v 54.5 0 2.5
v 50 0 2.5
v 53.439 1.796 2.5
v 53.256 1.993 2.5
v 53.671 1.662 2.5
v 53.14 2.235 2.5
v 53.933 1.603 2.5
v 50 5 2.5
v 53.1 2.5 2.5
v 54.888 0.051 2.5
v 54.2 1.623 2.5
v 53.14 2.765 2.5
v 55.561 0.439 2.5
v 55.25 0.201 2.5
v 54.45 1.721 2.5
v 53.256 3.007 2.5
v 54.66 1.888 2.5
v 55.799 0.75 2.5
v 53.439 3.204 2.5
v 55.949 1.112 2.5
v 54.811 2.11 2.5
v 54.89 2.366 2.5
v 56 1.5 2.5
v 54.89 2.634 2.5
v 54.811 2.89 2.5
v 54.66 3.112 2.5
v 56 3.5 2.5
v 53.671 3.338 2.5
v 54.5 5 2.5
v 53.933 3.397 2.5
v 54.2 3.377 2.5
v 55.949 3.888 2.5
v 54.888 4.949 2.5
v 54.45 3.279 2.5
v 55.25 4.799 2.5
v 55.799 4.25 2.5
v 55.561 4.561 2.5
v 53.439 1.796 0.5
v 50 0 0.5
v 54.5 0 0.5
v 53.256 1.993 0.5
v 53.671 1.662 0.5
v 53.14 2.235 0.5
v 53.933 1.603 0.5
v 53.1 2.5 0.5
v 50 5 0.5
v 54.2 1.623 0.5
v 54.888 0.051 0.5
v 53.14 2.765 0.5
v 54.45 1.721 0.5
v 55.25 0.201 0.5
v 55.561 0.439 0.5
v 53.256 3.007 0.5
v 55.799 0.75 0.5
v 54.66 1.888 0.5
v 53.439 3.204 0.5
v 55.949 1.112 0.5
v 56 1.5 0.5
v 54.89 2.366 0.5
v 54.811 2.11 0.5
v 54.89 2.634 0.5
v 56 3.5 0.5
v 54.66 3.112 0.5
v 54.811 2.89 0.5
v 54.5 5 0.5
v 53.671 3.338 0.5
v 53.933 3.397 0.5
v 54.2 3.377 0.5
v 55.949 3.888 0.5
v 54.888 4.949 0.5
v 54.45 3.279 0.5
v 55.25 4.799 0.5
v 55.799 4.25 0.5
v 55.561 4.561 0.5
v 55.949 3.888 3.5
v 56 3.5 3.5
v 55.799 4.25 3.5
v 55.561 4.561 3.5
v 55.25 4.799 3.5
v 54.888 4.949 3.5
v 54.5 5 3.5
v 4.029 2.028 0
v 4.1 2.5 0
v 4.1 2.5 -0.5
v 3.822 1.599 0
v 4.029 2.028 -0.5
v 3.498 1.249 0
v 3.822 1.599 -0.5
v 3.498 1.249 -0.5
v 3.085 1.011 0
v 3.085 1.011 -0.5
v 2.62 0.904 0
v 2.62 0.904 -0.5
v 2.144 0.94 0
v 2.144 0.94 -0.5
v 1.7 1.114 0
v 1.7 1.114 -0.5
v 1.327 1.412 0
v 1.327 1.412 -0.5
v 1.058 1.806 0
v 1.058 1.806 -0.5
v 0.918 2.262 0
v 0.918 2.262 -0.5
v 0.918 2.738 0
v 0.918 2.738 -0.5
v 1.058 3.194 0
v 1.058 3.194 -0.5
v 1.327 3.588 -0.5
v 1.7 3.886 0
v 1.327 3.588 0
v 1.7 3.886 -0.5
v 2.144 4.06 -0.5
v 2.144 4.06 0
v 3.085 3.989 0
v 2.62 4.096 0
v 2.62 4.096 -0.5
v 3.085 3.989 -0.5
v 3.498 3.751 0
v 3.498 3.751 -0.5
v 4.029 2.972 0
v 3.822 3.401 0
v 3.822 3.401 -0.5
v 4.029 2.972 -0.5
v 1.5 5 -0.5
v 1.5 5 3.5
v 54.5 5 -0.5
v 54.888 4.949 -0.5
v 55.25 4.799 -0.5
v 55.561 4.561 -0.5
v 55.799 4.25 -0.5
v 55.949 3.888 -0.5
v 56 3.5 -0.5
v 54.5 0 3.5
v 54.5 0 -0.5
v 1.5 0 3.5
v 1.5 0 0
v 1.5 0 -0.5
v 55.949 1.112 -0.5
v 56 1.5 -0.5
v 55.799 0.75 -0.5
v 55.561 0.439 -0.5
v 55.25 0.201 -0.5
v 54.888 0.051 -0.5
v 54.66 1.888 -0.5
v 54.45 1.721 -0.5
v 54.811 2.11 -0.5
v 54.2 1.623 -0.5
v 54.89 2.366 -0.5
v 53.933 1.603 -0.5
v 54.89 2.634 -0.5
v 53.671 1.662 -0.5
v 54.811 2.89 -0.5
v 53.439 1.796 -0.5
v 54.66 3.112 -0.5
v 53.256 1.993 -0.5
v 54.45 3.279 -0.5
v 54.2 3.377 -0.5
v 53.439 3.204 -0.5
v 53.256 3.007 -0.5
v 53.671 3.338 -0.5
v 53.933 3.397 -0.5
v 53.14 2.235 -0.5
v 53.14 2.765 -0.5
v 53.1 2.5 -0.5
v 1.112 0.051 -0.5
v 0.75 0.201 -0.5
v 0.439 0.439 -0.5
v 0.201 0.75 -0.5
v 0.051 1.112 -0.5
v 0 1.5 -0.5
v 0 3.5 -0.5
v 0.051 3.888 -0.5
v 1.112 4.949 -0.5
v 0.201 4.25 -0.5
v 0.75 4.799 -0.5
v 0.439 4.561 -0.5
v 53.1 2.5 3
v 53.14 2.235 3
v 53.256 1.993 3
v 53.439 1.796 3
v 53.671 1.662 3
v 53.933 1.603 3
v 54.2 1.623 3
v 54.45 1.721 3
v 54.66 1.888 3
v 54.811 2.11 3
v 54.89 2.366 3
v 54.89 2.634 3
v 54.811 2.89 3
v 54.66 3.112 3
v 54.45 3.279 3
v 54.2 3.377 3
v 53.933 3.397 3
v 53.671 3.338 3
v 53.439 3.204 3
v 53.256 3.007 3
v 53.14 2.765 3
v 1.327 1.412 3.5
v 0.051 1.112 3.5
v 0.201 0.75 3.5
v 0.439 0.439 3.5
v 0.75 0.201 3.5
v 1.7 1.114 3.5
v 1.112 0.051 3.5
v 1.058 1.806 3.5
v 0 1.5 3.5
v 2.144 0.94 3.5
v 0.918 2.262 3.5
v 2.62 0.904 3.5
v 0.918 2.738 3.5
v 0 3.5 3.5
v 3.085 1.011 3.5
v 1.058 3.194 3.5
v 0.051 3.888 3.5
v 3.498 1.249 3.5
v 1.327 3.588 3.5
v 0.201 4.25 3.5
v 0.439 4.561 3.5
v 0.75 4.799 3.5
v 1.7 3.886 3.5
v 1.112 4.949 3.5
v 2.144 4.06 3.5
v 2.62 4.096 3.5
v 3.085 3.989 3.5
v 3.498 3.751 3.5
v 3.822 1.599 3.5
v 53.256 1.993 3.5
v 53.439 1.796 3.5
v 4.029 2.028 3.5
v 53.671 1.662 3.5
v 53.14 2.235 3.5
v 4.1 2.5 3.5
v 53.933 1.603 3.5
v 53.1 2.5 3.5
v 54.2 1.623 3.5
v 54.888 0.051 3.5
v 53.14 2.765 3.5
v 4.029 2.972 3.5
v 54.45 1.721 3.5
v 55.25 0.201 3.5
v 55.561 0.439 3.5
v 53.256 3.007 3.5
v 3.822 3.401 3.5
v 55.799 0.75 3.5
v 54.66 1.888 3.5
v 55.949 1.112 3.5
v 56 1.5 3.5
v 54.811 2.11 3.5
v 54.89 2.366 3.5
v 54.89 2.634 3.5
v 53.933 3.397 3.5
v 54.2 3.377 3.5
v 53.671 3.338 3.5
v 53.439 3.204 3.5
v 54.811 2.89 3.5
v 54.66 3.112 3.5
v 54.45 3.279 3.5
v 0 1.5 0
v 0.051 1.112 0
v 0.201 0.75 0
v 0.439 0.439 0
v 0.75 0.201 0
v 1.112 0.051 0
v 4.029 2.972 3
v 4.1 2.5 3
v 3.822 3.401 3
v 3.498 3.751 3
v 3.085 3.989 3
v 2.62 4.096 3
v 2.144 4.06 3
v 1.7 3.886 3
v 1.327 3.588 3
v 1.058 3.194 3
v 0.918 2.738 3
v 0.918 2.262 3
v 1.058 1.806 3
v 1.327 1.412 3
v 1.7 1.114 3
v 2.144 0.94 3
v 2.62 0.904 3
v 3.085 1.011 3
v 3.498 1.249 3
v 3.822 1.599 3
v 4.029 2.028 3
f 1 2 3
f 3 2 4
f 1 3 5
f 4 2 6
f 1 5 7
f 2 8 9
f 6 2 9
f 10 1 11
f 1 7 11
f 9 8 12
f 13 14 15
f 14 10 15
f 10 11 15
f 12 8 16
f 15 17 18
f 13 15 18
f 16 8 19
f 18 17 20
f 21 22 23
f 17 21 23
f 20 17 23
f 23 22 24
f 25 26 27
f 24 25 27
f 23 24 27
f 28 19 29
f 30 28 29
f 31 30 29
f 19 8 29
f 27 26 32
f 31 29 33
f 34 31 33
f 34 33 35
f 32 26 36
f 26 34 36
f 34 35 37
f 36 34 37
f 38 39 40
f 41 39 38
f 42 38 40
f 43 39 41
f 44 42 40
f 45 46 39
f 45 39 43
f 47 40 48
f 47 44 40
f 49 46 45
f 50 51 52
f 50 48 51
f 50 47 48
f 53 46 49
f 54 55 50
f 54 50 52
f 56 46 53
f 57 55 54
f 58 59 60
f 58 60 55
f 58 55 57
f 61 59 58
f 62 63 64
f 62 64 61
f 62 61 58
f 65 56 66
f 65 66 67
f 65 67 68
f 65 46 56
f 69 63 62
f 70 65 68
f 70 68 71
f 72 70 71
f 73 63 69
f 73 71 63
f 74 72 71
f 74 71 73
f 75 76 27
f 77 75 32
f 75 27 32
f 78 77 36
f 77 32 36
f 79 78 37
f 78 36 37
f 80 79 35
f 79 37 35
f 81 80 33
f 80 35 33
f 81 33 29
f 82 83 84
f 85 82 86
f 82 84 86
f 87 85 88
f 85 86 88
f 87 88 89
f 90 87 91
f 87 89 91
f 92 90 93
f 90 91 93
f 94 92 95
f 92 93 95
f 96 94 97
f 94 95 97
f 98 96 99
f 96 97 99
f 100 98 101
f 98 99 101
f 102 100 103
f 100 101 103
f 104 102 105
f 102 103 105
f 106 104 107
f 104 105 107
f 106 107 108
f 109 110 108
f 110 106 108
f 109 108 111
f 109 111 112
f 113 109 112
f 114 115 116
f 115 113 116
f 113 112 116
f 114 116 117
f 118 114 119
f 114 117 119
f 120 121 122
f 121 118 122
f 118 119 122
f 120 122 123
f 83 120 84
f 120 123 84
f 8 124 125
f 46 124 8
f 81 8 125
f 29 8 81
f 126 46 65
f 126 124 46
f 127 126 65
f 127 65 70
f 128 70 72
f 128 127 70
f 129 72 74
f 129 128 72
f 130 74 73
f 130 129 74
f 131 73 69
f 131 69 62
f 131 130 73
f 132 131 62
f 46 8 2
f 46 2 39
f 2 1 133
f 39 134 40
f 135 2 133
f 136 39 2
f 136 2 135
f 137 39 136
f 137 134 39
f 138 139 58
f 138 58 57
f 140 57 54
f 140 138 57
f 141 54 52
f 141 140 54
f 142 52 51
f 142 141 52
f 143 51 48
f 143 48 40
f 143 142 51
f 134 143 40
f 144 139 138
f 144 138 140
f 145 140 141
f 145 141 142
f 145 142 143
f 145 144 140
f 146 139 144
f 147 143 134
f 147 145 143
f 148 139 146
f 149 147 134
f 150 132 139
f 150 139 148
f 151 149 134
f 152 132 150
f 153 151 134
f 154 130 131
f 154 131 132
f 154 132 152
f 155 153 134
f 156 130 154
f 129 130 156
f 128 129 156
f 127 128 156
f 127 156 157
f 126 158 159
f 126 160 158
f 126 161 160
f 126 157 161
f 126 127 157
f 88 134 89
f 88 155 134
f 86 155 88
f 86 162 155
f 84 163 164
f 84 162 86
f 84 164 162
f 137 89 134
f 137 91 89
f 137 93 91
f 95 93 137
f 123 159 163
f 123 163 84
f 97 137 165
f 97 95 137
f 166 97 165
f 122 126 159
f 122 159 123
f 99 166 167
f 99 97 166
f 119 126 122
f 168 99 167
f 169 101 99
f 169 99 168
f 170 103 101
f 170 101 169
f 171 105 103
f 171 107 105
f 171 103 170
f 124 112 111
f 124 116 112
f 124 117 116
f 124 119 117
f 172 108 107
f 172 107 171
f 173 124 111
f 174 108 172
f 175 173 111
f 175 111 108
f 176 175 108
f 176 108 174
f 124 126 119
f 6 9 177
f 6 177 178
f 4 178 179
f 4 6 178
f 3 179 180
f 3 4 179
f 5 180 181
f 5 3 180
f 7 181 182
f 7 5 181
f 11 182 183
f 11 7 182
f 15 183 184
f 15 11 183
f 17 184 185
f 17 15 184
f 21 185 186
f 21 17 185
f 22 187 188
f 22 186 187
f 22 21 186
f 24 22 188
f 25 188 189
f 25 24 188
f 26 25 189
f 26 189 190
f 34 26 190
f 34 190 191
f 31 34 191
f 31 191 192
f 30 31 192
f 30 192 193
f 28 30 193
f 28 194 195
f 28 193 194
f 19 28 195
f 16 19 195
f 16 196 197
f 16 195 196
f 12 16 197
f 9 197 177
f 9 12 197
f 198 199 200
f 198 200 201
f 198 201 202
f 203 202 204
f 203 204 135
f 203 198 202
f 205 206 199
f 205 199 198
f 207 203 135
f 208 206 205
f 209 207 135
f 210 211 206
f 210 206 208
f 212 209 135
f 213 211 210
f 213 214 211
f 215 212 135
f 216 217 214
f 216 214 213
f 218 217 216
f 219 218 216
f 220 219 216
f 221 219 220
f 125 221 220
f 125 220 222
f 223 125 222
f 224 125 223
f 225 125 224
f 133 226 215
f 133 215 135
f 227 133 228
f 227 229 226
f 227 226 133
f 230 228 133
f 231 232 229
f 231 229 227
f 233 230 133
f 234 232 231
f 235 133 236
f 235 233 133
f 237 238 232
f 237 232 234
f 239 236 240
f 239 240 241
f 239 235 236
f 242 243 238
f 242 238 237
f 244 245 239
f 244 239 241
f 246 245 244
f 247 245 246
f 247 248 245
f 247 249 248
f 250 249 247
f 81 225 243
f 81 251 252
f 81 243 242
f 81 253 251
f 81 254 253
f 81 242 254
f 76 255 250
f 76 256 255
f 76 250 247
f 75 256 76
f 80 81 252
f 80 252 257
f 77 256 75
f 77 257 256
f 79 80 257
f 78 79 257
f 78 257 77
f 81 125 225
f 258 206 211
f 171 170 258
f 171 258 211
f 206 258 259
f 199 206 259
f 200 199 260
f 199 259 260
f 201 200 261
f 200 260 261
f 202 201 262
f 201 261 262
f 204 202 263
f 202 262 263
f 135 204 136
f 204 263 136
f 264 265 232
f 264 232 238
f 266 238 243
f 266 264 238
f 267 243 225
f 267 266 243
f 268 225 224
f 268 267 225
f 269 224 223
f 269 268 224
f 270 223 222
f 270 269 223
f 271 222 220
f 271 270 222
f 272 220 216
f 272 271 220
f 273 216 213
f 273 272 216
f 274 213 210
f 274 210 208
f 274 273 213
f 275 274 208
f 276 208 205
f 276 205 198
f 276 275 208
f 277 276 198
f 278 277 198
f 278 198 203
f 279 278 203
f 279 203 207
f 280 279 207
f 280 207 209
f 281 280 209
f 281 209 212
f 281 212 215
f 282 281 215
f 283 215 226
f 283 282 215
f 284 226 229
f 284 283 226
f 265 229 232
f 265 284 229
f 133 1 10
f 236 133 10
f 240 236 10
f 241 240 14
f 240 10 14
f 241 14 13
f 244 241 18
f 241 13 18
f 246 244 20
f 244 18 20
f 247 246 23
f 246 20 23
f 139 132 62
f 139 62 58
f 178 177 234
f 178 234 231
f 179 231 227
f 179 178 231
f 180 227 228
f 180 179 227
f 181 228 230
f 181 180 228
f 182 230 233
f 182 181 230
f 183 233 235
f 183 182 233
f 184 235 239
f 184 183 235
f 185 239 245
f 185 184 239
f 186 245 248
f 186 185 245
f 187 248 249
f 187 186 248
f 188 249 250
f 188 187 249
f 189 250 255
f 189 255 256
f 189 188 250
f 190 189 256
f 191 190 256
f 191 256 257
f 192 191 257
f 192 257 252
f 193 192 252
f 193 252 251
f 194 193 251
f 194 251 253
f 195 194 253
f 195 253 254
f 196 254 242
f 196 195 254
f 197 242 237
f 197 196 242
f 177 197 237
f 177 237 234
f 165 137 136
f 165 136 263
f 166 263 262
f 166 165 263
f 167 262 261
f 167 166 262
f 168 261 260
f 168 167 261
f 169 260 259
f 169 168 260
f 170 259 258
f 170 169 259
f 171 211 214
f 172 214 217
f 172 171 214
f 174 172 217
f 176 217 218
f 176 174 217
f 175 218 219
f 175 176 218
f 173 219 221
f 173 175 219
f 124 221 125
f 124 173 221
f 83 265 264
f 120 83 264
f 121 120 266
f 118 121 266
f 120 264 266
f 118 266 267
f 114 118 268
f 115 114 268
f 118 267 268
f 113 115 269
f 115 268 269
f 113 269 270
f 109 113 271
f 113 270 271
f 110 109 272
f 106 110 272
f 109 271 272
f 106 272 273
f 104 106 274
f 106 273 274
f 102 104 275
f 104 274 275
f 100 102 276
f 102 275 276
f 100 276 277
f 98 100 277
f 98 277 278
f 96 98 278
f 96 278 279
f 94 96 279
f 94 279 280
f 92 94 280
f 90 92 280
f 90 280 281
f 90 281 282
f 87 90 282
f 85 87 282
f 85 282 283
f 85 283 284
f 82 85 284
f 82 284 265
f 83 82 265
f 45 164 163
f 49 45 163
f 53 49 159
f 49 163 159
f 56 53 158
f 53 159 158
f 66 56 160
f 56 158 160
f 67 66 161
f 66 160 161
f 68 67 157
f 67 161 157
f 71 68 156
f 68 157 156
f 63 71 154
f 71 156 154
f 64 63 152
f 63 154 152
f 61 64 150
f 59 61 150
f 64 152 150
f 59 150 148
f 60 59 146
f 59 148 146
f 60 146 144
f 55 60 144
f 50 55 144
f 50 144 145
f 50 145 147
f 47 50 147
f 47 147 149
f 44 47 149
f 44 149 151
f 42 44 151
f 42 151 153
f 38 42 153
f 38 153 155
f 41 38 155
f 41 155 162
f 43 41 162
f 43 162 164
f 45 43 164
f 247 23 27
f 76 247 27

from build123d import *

# Parameters (mm, degrees)
SKETCH_5_W          = 56
SKETCH_5_H          = 3
EXTRUDE_1_DEPTH     = 5
CUT_EXTRUDE_1_REACH = 58.303
SKETCH_6_R          = 1.6
CUT_EXTRUDE_2_REACH = 58.303
SKETCH_7_R          = 0.9
FILLET_1_R          = 1.5
SKETCH_8_W          = 6
SKETCH_8_H          = 1.6
CUT_EXTRUDE_3_DEPTH = 10
SKETCH_10_R         = 1.6
SKETCH_10_R_2       = 0.9
EXTRUDE_2_DEPTH     = 0.5
EXTRUDE_START       = 0.5
SKETCH_11_R         = 0.9
SKETCH_11_R_2       = 1.6
EXTRUDE_3_DEPTH     = 0.5
SKETCH_12_W         = 6.20639004
SKETCH_12_H         = 2
CUT_EXTRUDE_4_DEPTH = 10


with BuildPart() as part:
    # 草图5 → 凸台-拉伸1 (new body)
    with BuildSketch(Plane(origin=(0, 0, 0), x_dir=(1, 0, 0), z_dir=(0, 1, 0))):
        with Locations((28, -1.5)):
            Rectangle(SKETCH_5_W, SKETCH_5_H)
    extrude(amount=EXTRUDE_1_DEPTH)

    # 草图6 → 切除-拉伸1 (cut, up to next)
    with BuildSketch(Plane.XY.offset(3), mode=Mode.PRIVATE) as cut_extrude_1_sk1:
        with Locations((2.5, 2.5)):
            Circle(SKETCH_6_R)
    cut_extrude_1_tool1 = extrude(cut_extrude_1_sk1.sketch, amount=-CUT_EXTRUDE_1_REACH, mode=Mode.PRIVATE) & part.part
    add(cut_extrude_1_tool1.solids().sort_by_distance((2.5, 2.5, 3))[0], mode=Mode.SUBTRACT)

    # 草图7 → 切除-拉伸2 (cut, up to next)
    with BuildSketch(Plane.XY, mode=Mode.PRIVATE) as cut_extrude_2_sk1:
        with Locations(Location((54, 2.5, 0), (0, 0, 180))):
            Circle(SKETCH_7_R)
    cut_extrude_2_tool1 = extrude(cut_extrude_2_sk1.sketch, amount=CUT_EXTRUDE_2_REACH, mode=Mode.PRIVATE) & part.part
    add(cut_extrude_2_tool1.solids().sort_by_distance((54, 2.5, 0))[0], mode=Mode.SUBTRACT)

    # 圆角1
    fillet_1_edges = [part.edges().sort_by_distance(p)[0] for p in [
        (56, 5, 1.5),
        (56, 0, 1.5),
        (0, 0, 1.5),
        (0, 5, 1.5),
    ]]
    fillet(fillet_1_edges, radius=FILLET_1_R)

    # 草图8 → 切除-拉伸3 (cut)
    with BuildSketch(Plane(origin=(0, 5, 0), x_dir=(1, 0, 0), z_dir=(0, 1, 0))):
        with Locations((53, -1.5)):
            Rectangle(SKETCH_8_W, SKETCH_8_H)
    extrude(amount=-CUT_EXTRUDE_3_DEPTH, mode=Mode.SUBTRACT)

    # 草图10 → 凸台-拉伸2 (add)
    with BuildSketch(Plane.XY.offset(3)):
        with BuildLine():
            Line((56, 1.5), (56, 3.5))
            ThreePointArc((56, 3.5), (55.560660172, 4.560660172), (54.5, 5))
            Line((54.5, 5), (1.5, 5))
            ThreePointArc((1.5, 5), (0.439339828, 4.560660172), (0, 3.5))
            Line((0, 3.5), (0, 1.5))
            ThreePointArc((0, 1.5), (0.439339828, 0.439339828), (1.5, 0))
            Line((1.5, 0), (54.5, 0))
            ThreePointArc((54.5, 0), (55.560660172, 0.439339828), (56, 1.5))
        make_face()
        with Locations((2.5, 2.5)):
            Circle(SKETCH_10_R, mode=Mode.SUBTRACT)
        with Locations(Location((54, 2.5, 0), (0, 0, 180))):
            Circle(SKETCH_10_R_2, mode=Mode.SUBTRACT)
    extrude(amount=EXTRUDE_2_DEPTH)

    # 草图11 → 凸台-拉伸3 (add)
    with BuildSketch(Plane(origin=(0, 0, 0), x_dir=(-1, 0, 0), z_dir=(0, 0, -1)).offset(EXTRUDE_START)):
        with BuildLine():
            Line((-1.5, 5), (-54.5, 5))
            ThreePointArc((-54.5, 5), (-55.560660172, 4.560660172), (-56, 3.5))
            Line((-56, 3.5), (-56, 1.5))
            ThreePointArc((-56, 1.5), (-55.560660172, 0.439339828), (-54.5, 0))
            Line((-54.5, 0), (-1.5, 0))
            ThreePointArc((-1.5, 0), (-0.439339828, 0.439339828), (0, 1.5))
            Line((0, 1.5), (0, 3.5))
            ThreePointArc((0, 3.5), (-0.439339828, 4.560660172), (-1.5, 5))
        make_face()
        with Locations((-54, 2.5)):
            Circle(SKETCH_11_R, mode=Mode.SUBTRACT)
        with Locations(Location((-2.5, 2.5, 0), (0, 0, 180))):
            Circle(SKETCH_11_R_2, mode=Mode.SUBTRACT)
    extrude(amount=-EXTRUDE_3_DEPTH)

    # 草图12 → 切除-拉伸4 (cut)
    with BuildSketch(Plane(origin=(0, 5, 0), x_dir=(1, 0, 0), z_dir=(0, 1, 0))):
        with Locations((53.10319502, -1.5)):
            Rectangle(SKETCH_12_W, SKETCH_12_H)
    extrude(amount=-CUT_EXTRUDE_4_DEPTH, mode=Mode.SUBTRACT)


solid = part.part
